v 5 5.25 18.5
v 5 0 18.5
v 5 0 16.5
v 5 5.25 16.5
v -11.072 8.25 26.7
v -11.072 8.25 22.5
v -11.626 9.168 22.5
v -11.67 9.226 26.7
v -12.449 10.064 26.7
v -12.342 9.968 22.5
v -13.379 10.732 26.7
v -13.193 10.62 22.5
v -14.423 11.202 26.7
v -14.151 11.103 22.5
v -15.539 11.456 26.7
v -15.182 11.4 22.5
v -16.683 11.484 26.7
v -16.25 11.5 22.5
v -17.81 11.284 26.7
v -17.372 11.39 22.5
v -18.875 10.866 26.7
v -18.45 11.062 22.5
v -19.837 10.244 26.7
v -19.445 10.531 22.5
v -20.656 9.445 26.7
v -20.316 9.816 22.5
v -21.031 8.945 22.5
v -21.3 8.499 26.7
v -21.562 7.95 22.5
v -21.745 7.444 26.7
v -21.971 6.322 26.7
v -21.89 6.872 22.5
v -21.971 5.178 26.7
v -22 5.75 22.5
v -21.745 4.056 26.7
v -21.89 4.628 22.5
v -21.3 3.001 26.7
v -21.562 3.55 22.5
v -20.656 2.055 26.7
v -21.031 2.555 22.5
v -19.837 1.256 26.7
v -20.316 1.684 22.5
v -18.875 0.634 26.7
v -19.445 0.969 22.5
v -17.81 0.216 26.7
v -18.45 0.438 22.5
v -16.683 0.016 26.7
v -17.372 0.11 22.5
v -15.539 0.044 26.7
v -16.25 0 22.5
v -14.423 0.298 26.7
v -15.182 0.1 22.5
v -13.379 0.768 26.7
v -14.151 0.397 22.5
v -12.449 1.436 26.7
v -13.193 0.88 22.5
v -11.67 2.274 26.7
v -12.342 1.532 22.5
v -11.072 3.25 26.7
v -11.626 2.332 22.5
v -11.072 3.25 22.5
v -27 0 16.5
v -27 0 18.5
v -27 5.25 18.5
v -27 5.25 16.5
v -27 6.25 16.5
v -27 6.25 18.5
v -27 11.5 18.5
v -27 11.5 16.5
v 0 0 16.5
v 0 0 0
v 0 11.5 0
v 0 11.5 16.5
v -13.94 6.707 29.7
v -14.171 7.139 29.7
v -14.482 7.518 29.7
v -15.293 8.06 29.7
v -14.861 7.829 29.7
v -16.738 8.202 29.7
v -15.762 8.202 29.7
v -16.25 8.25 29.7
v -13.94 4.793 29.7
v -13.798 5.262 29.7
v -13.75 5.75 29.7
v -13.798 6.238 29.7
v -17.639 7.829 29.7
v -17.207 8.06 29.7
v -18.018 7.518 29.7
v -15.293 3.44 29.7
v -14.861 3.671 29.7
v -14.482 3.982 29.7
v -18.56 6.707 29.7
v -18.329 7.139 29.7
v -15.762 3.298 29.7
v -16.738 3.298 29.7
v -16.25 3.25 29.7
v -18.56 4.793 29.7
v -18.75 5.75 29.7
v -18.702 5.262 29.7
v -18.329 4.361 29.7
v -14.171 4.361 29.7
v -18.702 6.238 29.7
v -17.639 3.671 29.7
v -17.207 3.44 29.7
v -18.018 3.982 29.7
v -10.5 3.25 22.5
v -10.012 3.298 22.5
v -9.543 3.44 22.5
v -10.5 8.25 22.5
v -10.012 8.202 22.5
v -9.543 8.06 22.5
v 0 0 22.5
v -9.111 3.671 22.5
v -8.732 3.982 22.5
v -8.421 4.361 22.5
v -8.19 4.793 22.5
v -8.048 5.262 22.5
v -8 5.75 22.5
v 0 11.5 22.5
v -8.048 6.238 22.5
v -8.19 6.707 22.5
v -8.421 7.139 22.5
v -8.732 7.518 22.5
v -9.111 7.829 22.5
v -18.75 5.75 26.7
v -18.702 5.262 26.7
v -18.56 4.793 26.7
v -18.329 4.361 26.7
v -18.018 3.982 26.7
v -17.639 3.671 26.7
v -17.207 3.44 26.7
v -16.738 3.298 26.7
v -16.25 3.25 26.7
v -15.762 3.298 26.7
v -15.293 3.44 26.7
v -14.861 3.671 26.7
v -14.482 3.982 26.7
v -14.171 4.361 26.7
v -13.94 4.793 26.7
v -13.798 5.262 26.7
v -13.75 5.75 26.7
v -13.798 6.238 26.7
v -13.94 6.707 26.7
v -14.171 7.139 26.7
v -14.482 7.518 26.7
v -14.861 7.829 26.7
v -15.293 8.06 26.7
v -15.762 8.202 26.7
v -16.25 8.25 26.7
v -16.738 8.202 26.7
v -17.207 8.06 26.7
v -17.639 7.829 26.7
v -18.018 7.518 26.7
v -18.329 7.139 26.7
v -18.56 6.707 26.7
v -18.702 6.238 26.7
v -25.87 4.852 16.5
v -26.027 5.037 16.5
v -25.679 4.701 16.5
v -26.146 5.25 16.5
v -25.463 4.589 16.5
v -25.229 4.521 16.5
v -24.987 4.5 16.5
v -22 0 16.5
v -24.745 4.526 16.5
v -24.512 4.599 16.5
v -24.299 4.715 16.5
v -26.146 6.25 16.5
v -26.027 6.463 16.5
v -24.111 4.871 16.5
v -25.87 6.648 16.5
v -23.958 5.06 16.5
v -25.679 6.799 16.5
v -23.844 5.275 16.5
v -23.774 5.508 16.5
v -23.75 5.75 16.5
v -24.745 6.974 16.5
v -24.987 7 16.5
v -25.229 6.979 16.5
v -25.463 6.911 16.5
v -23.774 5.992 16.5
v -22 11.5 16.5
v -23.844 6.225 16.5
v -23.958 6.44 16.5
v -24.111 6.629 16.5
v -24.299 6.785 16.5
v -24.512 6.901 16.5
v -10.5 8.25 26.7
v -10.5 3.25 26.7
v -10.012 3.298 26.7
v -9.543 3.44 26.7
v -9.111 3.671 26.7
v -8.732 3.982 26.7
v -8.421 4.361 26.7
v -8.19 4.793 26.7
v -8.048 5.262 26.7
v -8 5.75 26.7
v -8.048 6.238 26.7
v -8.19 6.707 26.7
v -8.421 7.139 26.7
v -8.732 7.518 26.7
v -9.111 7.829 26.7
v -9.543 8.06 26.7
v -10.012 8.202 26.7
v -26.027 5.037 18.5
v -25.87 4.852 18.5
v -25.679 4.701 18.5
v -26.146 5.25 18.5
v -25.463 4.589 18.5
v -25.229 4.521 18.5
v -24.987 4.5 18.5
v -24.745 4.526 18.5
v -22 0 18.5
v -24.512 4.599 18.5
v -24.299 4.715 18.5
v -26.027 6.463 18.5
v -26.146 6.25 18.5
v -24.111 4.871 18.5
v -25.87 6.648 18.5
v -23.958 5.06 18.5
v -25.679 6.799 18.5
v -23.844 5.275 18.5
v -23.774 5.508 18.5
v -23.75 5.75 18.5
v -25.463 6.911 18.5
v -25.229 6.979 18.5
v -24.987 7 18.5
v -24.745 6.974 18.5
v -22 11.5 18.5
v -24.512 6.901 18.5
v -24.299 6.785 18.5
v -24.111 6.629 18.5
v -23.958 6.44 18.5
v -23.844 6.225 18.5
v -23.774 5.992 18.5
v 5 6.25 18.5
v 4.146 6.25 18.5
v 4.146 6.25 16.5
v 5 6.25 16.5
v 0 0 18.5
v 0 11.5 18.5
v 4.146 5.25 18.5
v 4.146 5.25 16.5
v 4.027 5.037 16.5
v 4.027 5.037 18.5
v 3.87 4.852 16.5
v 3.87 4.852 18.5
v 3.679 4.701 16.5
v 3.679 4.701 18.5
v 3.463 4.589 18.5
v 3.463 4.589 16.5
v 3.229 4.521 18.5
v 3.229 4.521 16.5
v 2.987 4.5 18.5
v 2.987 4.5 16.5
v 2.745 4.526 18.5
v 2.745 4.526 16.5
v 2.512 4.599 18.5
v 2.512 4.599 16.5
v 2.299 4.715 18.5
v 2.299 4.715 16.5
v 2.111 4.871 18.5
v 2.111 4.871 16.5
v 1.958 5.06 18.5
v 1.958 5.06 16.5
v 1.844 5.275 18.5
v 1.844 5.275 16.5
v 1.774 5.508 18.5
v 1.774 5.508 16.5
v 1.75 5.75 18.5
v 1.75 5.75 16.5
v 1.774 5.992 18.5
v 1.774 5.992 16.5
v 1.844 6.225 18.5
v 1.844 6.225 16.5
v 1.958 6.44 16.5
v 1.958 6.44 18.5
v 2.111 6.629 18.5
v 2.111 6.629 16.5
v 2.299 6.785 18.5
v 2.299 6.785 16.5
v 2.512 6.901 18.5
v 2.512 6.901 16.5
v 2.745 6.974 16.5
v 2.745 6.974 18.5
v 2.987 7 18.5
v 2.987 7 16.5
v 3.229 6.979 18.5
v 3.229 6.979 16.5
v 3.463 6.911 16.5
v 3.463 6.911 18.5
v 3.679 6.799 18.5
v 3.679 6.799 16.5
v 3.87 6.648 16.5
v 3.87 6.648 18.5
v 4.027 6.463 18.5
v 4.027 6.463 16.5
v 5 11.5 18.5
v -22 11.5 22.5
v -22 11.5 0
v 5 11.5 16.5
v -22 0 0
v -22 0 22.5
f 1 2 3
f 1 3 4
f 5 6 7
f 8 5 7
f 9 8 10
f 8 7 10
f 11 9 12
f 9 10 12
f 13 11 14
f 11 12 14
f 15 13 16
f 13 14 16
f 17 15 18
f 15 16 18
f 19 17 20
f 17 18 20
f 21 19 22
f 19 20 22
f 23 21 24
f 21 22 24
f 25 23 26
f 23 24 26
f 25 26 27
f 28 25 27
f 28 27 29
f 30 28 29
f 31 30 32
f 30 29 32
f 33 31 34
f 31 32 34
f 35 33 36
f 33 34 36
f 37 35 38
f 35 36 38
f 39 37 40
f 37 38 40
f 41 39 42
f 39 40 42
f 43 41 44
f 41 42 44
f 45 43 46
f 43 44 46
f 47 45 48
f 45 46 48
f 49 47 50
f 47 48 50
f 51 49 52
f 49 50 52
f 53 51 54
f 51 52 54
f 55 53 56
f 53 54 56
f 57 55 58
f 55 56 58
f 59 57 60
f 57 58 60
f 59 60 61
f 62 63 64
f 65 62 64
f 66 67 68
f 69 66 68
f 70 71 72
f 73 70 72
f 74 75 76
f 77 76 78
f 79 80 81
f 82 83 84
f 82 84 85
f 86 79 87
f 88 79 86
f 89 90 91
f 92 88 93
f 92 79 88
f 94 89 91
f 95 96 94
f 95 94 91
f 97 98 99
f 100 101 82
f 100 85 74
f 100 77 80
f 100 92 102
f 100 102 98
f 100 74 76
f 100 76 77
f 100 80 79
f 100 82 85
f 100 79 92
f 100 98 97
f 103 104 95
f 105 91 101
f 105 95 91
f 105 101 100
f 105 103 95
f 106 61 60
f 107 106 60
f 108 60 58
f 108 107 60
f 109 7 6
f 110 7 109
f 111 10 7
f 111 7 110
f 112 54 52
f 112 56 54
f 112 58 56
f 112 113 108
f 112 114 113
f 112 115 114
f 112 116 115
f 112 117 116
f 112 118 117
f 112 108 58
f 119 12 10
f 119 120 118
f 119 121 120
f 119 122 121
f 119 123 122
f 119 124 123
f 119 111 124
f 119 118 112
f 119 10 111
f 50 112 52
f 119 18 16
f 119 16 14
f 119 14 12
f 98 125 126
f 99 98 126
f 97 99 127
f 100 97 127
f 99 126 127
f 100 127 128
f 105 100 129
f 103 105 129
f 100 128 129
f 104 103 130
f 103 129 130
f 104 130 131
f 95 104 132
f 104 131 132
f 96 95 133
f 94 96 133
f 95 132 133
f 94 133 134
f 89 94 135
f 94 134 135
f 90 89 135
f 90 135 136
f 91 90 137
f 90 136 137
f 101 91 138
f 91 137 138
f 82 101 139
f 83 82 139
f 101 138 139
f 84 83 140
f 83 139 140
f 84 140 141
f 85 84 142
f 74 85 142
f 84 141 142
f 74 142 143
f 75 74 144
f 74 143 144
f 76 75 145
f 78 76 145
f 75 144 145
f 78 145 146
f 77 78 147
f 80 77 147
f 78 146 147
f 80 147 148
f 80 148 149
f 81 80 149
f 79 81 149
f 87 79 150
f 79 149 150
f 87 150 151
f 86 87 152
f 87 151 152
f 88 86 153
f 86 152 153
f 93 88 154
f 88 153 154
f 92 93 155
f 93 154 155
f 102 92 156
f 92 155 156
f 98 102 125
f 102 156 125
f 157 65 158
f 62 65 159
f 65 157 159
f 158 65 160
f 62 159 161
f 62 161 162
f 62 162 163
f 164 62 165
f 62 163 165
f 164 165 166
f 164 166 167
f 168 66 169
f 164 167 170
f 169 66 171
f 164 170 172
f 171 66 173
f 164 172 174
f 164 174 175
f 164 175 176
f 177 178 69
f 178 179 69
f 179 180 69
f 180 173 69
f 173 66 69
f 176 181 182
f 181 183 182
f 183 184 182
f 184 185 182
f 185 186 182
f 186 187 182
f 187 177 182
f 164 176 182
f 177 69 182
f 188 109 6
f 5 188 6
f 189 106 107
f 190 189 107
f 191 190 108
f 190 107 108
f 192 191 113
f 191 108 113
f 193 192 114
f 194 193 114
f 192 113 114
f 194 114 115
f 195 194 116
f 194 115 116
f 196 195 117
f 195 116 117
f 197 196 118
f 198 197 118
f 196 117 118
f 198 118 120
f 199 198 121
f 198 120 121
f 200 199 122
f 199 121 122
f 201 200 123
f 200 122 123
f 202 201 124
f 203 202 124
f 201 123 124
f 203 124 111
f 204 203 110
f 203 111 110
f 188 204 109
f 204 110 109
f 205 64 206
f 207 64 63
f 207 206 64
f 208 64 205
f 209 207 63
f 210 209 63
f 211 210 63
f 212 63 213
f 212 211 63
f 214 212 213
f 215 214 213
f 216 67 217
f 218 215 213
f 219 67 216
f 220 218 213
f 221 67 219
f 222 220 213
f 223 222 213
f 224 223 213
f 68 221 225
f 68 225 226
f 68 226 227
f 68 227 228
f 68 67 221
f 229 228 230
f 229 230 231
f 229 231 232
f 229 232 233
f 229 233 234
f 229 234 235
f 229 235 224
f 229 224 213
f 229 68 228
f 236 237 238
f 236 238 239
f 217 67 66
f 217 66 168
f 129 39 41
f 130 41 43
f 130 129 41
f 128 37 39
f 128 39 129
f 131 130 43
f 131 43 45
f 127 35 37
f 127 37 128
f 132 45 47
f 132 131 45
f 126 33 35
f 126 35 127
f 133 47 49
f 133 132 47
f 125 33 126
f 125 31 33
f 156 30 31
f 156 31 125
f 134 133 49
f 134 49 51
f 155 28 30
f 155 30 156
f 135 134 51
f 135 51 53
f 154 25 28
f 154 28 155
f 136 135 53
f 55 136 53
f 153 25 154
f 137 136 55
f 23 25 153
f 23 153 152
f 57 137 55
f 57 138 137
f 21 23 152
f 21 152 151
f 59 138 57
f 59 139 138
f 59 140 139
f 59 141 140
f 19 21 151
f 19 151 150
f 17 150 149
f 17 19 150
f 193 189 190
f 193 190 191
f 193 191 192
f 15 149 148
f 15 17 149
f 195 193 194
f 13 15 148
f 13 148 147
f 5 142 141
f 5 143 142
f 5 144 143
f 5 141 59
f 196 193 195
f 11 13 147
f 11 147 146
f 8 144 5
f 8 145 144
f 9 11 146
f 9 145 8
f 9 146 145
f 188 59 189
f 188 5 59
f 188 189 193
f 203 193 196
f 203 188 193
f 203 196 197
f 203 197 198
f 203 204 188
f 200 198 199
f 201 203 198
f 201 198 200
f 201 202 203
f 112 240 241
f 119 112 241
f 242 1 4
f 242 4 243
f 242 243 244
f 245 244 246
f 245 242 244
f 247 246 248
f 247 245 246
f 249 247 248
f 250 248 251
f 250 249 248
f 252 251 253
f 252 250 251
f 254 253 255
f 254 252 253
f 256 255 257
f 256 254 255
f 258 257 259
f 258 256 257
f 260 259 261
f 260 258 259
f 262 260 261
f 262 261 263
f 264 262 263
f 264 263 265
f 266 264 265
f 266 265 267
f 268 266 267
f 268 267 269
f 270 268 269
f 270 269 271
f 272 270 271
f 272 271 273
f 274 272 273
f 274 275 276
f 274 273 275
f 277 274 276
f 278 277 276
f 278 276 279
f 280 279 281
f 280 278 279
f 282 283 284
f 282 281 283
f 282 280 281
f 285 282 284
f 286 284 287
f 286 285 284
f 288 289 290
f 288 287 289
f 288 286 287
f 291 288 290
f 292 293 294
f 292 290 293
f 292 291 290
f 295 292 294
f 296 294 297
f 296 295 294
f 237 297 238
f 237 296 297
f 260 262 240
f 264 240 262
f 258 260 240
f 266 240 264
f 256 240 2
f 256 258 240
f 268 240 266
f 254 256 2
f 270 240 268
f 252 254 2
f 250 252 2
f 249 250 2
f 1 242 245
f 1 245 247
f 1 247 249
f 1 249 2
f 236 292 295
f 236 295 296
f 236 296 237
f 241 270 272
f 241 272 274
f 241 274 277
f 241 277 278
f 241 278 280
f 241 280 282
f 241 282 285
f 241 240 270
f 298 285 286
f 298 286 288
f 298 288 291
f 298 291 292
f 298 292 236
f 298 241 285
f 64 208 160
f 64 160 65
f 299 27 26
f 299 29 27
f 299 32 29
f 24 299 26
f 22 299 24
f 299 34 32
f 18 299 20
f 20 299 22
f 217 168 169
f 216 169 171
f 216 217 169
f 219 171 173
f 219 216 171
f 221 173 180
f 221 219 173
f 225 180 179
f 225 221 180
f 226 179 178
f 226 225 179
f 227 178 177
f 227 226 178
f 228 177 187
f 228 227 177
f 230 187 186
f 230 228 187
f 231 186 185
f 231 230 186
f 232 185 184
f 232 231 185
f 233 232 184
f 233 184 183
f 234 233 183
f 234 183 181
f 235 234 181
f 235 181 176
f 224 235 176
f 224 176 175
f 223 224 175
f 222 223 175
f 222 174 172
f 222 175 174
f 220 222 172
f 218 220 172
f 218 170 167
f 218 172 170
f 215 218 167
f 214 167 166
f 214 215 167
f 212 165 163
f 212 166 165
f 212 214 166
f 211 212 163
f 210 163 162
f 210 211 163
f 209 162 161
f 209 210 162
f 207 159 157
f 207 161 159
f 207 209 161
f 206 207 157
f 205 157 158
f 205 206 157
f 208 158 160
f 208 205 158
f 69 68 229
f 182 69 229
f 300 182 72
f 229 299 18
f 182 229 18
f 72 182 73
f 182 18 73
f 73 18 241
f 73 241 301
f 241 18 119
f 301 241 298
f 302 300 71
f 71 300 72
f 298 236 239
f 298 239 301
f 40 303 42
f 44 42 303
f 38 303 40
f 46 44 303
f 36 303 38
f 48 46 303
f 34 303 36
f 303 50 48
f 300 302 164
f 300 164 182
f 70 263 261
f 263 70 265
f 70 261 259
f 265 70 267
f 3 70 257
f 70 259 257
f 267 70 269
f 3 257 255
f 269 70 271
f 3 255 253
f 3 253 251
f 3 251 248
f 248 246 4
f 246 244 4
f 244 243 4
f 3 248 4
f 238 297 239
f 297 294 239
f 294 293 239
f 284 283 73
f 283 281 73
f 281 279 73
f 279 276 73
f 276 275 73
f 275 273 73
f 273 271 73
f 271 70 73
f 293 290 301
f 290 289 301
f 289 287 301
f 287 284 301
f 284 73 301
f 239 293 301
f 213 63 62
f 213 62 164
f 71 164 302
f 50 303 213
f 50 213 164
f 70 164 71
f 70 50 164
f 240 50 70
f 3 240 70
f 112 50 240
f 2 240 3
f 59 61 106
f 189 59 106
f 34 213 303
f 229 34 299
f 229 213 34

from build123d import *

# Parameters (mm, degrees)
ESQUISSE1_W             = 22
ESQUISSE1_H             = 11.5
BOSS_EXTRU_1_DEPTH      = 22.5
ESQUISSE2_W             = 32
ESQUISSE2_H             = 11.5
BOSS_EXTRU_2_DEPTH      = 2
ENL_V_MAT_EXTRU_1_DEPTH = 35.691497517
BOSS_EXTRU_3_DEPTH      = 4.2
ESQUISSE5_R             = 2.5
BOSS_EXTRU_4_DEPTH      = 3


with BuildPart() as part:
    # Esquisse1 → Boss.-Extru.1 (new body)
    with BuildSketch(Plane.XY):
        with Locations((-11, 5.75)):
            Rectangle(ESQUISSE1_W, ESQUISSE1_H)
    extrude(amount=BOSS_EXTRU_1_DEPTH)

    # Esquisse2 → Boss.-Extru.2 (add)
    with BuildSketch(Plane.XY.offset(18.5)):
        with Locations((-11, 5.75)):
            Rectangle(ESQUISSE2_W, ESQUISSE2_H)
    extrude(amount=-BOSS_EXTRU_2_DEPTH)

    # Esquisse3 → Enlèv. mat.-Extru.1 (cut, through all)
    with BuildSketch(Plane.XY.offset(18.5)):
        with BuildLine():
            Line((4.145643924, 6.25), (5, 6.25))
            Line((5, 6.25), (5, 5.25))
            Line((5, 5.25), (4.145643924, 5.25))
            ThreePointArc((4.145643924, 5.25), (1.75, 5.75), (4.145643924, 6.25))
        make_face()
        with BuildLine():
            Line((-26.145643924, 5.25), (-27, 5.25))
            Line((-27, 5.25), (-27, 6.25))
            Line((-27, 6.25), (-26.145643924, 6.25))
            ThreePointArc((-26.145643924, 6.25), (-23.75, 5.75), (-26.145643924, 5.25))
        make_face()
    extrude(amount=-ENL_V_MAT_EXTRU_1_DEPTH, mode=Mode.SUBTRACT)

    # Esquisse4 → Boss.-Extru.3 (add)
    with BuildSketch(Plane.XY.offset(22.5)):
        with BuildLine():
            Line((-10.5, 8.25), (-11.071921206, 8.25))
            ThreePointArc((-11.071921206, 8.25), (-22, 5.75), (-11.071921206, 3.25))
            Line((-11.071921206, 3.25), (-10.5, 3.25))
            ThreePointArc((-10.5, 3.25), (-8, 5.75), (-10.5, 8.25))
        make_face()
    extrude(amount=BOSS_EXTRU_3_DEPTH)

    # Esquisse5 → Boss.-Extru.4 (add)
    with BuildSketch(Plane.XY.offset(26.7)):
        with Locations((-16.25, 5.75)):
            Circle(ESQUISSE5_R)
    extrude(amount=BOSS_EXTRU_4_DEPTH)


solid = part.part
